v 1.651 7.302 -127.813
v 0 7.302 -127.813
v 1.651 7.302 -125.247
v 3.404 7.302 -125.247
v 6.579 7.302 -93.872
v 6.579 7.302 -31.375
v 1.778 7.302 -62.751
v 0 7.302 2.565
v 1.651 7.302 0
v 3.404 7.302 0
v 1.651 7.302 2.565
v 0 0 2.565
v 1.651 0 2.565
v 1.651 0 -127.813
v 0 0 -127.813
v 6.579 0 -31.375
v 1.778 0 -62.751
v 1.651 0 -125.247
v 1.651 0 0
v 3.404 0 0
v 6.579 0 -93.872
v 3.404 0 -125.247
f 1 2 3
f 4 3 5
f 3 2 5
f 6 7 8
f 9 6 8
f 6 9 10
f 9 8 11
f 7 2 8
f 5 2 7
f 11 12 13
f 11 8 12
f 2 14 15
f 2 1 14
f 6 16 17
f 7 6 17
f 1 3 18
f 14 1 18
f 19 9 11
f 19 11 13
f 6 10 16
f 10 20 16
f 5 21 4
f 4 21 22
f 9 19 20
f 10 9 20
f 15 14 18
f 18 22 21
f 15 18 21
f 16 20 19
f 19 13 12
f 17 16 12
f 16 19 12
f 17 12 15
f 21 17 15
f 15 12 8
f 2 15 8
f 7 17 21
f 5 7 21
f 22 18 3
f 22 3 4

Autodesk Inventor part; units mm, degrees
ref_plane "YZ Plane" through (0, 0, 0) normal (1, 0, 0) x (0, 1, 0)
ref_plane "XZ Plane" through (0, 0, 0) normal (0, 1, 0) x (-1, 0, 0)
ref_plane "XY Plane" through (0, 0, 0) normal (0, 0, 1) x (1, 0, 0)
sketch "Sketch1" plane through (0, 0, 0) normal (0, 1, 0) x (-1, 0, 0)
  line L0 (0, 0) -> (0, -125.2474)
  line L1 (0, -125.2474) -> (-3.4036, -125.2474)
  line L2 (0, 0) -> (-3.4036, 0)
  line L3 (-3.4036, 0) -> (-6.5786, -31.3753)
  line L4 (-6.5786, -31.3753) -> (-1.778, -62.7507)
  line L5 (-1.778, -62.7507) -> (-6.5786, -93.8721)
  line L6 (-6.5786, -93.8721) -> (-3.4036, -125.2474)
  dimension "d0" = 125.2474
  dimension "d1" = 3.4036
  dimension "d2" = 3.4036
  dimension "d3" = 31.3754
  dimension "d4" = 62.7507
  dimension "d5" = 31.3754
  dimension "d6" = 3.175
  dimension "d7" = 3.175
extrude "Extrusion1" add sketch "Sketch1" along normal blind 7.3025
sketch "Sketch2" plane through (0, 0, 0) normal (0, 0, 1) x (1, 0, 0)
  line L0 (0, 0) -> (0, 7.3025) projected
  line L1 (3.4036, 0) -> (0, 0) projected
  line L2 (0, 7.3025) -> (1.651, 7.3025)
  line L3 (1.651, 7.3025) -> (1.651, 0)
  line L4 (1.651, 0) -> (0, 0)
  line L5 (0, 0) -> (0, 7.3025)
  dimension "d10" = 1.651
sketch "Sketch3" plane through (3.4036, 0, -125.2474) normal (0, 0, -1) x (-1, 0, 0)
  line L0 (0, 0) -> (3.4036, 0) projected
  line L1 (3.4036, 7.3025) -> (1.7526, 7.3025)
  line L2 (1.7526, 7.3025) -> (1.7526, 0)
  line L3 (1.7526, 0) -> (3.4036, 0)
  line L4 (3.4036, 0) -> (3.4036, 7.3025)
  dimension "d11" = 1.651
extrude "Extrusion2" add sketch "Sketch2" along normal blind 2.5654
extrude "Extrusion3" add sketch "Sketch3" along normal blind 2.5654
properties part number "long_insert_CPY1"
